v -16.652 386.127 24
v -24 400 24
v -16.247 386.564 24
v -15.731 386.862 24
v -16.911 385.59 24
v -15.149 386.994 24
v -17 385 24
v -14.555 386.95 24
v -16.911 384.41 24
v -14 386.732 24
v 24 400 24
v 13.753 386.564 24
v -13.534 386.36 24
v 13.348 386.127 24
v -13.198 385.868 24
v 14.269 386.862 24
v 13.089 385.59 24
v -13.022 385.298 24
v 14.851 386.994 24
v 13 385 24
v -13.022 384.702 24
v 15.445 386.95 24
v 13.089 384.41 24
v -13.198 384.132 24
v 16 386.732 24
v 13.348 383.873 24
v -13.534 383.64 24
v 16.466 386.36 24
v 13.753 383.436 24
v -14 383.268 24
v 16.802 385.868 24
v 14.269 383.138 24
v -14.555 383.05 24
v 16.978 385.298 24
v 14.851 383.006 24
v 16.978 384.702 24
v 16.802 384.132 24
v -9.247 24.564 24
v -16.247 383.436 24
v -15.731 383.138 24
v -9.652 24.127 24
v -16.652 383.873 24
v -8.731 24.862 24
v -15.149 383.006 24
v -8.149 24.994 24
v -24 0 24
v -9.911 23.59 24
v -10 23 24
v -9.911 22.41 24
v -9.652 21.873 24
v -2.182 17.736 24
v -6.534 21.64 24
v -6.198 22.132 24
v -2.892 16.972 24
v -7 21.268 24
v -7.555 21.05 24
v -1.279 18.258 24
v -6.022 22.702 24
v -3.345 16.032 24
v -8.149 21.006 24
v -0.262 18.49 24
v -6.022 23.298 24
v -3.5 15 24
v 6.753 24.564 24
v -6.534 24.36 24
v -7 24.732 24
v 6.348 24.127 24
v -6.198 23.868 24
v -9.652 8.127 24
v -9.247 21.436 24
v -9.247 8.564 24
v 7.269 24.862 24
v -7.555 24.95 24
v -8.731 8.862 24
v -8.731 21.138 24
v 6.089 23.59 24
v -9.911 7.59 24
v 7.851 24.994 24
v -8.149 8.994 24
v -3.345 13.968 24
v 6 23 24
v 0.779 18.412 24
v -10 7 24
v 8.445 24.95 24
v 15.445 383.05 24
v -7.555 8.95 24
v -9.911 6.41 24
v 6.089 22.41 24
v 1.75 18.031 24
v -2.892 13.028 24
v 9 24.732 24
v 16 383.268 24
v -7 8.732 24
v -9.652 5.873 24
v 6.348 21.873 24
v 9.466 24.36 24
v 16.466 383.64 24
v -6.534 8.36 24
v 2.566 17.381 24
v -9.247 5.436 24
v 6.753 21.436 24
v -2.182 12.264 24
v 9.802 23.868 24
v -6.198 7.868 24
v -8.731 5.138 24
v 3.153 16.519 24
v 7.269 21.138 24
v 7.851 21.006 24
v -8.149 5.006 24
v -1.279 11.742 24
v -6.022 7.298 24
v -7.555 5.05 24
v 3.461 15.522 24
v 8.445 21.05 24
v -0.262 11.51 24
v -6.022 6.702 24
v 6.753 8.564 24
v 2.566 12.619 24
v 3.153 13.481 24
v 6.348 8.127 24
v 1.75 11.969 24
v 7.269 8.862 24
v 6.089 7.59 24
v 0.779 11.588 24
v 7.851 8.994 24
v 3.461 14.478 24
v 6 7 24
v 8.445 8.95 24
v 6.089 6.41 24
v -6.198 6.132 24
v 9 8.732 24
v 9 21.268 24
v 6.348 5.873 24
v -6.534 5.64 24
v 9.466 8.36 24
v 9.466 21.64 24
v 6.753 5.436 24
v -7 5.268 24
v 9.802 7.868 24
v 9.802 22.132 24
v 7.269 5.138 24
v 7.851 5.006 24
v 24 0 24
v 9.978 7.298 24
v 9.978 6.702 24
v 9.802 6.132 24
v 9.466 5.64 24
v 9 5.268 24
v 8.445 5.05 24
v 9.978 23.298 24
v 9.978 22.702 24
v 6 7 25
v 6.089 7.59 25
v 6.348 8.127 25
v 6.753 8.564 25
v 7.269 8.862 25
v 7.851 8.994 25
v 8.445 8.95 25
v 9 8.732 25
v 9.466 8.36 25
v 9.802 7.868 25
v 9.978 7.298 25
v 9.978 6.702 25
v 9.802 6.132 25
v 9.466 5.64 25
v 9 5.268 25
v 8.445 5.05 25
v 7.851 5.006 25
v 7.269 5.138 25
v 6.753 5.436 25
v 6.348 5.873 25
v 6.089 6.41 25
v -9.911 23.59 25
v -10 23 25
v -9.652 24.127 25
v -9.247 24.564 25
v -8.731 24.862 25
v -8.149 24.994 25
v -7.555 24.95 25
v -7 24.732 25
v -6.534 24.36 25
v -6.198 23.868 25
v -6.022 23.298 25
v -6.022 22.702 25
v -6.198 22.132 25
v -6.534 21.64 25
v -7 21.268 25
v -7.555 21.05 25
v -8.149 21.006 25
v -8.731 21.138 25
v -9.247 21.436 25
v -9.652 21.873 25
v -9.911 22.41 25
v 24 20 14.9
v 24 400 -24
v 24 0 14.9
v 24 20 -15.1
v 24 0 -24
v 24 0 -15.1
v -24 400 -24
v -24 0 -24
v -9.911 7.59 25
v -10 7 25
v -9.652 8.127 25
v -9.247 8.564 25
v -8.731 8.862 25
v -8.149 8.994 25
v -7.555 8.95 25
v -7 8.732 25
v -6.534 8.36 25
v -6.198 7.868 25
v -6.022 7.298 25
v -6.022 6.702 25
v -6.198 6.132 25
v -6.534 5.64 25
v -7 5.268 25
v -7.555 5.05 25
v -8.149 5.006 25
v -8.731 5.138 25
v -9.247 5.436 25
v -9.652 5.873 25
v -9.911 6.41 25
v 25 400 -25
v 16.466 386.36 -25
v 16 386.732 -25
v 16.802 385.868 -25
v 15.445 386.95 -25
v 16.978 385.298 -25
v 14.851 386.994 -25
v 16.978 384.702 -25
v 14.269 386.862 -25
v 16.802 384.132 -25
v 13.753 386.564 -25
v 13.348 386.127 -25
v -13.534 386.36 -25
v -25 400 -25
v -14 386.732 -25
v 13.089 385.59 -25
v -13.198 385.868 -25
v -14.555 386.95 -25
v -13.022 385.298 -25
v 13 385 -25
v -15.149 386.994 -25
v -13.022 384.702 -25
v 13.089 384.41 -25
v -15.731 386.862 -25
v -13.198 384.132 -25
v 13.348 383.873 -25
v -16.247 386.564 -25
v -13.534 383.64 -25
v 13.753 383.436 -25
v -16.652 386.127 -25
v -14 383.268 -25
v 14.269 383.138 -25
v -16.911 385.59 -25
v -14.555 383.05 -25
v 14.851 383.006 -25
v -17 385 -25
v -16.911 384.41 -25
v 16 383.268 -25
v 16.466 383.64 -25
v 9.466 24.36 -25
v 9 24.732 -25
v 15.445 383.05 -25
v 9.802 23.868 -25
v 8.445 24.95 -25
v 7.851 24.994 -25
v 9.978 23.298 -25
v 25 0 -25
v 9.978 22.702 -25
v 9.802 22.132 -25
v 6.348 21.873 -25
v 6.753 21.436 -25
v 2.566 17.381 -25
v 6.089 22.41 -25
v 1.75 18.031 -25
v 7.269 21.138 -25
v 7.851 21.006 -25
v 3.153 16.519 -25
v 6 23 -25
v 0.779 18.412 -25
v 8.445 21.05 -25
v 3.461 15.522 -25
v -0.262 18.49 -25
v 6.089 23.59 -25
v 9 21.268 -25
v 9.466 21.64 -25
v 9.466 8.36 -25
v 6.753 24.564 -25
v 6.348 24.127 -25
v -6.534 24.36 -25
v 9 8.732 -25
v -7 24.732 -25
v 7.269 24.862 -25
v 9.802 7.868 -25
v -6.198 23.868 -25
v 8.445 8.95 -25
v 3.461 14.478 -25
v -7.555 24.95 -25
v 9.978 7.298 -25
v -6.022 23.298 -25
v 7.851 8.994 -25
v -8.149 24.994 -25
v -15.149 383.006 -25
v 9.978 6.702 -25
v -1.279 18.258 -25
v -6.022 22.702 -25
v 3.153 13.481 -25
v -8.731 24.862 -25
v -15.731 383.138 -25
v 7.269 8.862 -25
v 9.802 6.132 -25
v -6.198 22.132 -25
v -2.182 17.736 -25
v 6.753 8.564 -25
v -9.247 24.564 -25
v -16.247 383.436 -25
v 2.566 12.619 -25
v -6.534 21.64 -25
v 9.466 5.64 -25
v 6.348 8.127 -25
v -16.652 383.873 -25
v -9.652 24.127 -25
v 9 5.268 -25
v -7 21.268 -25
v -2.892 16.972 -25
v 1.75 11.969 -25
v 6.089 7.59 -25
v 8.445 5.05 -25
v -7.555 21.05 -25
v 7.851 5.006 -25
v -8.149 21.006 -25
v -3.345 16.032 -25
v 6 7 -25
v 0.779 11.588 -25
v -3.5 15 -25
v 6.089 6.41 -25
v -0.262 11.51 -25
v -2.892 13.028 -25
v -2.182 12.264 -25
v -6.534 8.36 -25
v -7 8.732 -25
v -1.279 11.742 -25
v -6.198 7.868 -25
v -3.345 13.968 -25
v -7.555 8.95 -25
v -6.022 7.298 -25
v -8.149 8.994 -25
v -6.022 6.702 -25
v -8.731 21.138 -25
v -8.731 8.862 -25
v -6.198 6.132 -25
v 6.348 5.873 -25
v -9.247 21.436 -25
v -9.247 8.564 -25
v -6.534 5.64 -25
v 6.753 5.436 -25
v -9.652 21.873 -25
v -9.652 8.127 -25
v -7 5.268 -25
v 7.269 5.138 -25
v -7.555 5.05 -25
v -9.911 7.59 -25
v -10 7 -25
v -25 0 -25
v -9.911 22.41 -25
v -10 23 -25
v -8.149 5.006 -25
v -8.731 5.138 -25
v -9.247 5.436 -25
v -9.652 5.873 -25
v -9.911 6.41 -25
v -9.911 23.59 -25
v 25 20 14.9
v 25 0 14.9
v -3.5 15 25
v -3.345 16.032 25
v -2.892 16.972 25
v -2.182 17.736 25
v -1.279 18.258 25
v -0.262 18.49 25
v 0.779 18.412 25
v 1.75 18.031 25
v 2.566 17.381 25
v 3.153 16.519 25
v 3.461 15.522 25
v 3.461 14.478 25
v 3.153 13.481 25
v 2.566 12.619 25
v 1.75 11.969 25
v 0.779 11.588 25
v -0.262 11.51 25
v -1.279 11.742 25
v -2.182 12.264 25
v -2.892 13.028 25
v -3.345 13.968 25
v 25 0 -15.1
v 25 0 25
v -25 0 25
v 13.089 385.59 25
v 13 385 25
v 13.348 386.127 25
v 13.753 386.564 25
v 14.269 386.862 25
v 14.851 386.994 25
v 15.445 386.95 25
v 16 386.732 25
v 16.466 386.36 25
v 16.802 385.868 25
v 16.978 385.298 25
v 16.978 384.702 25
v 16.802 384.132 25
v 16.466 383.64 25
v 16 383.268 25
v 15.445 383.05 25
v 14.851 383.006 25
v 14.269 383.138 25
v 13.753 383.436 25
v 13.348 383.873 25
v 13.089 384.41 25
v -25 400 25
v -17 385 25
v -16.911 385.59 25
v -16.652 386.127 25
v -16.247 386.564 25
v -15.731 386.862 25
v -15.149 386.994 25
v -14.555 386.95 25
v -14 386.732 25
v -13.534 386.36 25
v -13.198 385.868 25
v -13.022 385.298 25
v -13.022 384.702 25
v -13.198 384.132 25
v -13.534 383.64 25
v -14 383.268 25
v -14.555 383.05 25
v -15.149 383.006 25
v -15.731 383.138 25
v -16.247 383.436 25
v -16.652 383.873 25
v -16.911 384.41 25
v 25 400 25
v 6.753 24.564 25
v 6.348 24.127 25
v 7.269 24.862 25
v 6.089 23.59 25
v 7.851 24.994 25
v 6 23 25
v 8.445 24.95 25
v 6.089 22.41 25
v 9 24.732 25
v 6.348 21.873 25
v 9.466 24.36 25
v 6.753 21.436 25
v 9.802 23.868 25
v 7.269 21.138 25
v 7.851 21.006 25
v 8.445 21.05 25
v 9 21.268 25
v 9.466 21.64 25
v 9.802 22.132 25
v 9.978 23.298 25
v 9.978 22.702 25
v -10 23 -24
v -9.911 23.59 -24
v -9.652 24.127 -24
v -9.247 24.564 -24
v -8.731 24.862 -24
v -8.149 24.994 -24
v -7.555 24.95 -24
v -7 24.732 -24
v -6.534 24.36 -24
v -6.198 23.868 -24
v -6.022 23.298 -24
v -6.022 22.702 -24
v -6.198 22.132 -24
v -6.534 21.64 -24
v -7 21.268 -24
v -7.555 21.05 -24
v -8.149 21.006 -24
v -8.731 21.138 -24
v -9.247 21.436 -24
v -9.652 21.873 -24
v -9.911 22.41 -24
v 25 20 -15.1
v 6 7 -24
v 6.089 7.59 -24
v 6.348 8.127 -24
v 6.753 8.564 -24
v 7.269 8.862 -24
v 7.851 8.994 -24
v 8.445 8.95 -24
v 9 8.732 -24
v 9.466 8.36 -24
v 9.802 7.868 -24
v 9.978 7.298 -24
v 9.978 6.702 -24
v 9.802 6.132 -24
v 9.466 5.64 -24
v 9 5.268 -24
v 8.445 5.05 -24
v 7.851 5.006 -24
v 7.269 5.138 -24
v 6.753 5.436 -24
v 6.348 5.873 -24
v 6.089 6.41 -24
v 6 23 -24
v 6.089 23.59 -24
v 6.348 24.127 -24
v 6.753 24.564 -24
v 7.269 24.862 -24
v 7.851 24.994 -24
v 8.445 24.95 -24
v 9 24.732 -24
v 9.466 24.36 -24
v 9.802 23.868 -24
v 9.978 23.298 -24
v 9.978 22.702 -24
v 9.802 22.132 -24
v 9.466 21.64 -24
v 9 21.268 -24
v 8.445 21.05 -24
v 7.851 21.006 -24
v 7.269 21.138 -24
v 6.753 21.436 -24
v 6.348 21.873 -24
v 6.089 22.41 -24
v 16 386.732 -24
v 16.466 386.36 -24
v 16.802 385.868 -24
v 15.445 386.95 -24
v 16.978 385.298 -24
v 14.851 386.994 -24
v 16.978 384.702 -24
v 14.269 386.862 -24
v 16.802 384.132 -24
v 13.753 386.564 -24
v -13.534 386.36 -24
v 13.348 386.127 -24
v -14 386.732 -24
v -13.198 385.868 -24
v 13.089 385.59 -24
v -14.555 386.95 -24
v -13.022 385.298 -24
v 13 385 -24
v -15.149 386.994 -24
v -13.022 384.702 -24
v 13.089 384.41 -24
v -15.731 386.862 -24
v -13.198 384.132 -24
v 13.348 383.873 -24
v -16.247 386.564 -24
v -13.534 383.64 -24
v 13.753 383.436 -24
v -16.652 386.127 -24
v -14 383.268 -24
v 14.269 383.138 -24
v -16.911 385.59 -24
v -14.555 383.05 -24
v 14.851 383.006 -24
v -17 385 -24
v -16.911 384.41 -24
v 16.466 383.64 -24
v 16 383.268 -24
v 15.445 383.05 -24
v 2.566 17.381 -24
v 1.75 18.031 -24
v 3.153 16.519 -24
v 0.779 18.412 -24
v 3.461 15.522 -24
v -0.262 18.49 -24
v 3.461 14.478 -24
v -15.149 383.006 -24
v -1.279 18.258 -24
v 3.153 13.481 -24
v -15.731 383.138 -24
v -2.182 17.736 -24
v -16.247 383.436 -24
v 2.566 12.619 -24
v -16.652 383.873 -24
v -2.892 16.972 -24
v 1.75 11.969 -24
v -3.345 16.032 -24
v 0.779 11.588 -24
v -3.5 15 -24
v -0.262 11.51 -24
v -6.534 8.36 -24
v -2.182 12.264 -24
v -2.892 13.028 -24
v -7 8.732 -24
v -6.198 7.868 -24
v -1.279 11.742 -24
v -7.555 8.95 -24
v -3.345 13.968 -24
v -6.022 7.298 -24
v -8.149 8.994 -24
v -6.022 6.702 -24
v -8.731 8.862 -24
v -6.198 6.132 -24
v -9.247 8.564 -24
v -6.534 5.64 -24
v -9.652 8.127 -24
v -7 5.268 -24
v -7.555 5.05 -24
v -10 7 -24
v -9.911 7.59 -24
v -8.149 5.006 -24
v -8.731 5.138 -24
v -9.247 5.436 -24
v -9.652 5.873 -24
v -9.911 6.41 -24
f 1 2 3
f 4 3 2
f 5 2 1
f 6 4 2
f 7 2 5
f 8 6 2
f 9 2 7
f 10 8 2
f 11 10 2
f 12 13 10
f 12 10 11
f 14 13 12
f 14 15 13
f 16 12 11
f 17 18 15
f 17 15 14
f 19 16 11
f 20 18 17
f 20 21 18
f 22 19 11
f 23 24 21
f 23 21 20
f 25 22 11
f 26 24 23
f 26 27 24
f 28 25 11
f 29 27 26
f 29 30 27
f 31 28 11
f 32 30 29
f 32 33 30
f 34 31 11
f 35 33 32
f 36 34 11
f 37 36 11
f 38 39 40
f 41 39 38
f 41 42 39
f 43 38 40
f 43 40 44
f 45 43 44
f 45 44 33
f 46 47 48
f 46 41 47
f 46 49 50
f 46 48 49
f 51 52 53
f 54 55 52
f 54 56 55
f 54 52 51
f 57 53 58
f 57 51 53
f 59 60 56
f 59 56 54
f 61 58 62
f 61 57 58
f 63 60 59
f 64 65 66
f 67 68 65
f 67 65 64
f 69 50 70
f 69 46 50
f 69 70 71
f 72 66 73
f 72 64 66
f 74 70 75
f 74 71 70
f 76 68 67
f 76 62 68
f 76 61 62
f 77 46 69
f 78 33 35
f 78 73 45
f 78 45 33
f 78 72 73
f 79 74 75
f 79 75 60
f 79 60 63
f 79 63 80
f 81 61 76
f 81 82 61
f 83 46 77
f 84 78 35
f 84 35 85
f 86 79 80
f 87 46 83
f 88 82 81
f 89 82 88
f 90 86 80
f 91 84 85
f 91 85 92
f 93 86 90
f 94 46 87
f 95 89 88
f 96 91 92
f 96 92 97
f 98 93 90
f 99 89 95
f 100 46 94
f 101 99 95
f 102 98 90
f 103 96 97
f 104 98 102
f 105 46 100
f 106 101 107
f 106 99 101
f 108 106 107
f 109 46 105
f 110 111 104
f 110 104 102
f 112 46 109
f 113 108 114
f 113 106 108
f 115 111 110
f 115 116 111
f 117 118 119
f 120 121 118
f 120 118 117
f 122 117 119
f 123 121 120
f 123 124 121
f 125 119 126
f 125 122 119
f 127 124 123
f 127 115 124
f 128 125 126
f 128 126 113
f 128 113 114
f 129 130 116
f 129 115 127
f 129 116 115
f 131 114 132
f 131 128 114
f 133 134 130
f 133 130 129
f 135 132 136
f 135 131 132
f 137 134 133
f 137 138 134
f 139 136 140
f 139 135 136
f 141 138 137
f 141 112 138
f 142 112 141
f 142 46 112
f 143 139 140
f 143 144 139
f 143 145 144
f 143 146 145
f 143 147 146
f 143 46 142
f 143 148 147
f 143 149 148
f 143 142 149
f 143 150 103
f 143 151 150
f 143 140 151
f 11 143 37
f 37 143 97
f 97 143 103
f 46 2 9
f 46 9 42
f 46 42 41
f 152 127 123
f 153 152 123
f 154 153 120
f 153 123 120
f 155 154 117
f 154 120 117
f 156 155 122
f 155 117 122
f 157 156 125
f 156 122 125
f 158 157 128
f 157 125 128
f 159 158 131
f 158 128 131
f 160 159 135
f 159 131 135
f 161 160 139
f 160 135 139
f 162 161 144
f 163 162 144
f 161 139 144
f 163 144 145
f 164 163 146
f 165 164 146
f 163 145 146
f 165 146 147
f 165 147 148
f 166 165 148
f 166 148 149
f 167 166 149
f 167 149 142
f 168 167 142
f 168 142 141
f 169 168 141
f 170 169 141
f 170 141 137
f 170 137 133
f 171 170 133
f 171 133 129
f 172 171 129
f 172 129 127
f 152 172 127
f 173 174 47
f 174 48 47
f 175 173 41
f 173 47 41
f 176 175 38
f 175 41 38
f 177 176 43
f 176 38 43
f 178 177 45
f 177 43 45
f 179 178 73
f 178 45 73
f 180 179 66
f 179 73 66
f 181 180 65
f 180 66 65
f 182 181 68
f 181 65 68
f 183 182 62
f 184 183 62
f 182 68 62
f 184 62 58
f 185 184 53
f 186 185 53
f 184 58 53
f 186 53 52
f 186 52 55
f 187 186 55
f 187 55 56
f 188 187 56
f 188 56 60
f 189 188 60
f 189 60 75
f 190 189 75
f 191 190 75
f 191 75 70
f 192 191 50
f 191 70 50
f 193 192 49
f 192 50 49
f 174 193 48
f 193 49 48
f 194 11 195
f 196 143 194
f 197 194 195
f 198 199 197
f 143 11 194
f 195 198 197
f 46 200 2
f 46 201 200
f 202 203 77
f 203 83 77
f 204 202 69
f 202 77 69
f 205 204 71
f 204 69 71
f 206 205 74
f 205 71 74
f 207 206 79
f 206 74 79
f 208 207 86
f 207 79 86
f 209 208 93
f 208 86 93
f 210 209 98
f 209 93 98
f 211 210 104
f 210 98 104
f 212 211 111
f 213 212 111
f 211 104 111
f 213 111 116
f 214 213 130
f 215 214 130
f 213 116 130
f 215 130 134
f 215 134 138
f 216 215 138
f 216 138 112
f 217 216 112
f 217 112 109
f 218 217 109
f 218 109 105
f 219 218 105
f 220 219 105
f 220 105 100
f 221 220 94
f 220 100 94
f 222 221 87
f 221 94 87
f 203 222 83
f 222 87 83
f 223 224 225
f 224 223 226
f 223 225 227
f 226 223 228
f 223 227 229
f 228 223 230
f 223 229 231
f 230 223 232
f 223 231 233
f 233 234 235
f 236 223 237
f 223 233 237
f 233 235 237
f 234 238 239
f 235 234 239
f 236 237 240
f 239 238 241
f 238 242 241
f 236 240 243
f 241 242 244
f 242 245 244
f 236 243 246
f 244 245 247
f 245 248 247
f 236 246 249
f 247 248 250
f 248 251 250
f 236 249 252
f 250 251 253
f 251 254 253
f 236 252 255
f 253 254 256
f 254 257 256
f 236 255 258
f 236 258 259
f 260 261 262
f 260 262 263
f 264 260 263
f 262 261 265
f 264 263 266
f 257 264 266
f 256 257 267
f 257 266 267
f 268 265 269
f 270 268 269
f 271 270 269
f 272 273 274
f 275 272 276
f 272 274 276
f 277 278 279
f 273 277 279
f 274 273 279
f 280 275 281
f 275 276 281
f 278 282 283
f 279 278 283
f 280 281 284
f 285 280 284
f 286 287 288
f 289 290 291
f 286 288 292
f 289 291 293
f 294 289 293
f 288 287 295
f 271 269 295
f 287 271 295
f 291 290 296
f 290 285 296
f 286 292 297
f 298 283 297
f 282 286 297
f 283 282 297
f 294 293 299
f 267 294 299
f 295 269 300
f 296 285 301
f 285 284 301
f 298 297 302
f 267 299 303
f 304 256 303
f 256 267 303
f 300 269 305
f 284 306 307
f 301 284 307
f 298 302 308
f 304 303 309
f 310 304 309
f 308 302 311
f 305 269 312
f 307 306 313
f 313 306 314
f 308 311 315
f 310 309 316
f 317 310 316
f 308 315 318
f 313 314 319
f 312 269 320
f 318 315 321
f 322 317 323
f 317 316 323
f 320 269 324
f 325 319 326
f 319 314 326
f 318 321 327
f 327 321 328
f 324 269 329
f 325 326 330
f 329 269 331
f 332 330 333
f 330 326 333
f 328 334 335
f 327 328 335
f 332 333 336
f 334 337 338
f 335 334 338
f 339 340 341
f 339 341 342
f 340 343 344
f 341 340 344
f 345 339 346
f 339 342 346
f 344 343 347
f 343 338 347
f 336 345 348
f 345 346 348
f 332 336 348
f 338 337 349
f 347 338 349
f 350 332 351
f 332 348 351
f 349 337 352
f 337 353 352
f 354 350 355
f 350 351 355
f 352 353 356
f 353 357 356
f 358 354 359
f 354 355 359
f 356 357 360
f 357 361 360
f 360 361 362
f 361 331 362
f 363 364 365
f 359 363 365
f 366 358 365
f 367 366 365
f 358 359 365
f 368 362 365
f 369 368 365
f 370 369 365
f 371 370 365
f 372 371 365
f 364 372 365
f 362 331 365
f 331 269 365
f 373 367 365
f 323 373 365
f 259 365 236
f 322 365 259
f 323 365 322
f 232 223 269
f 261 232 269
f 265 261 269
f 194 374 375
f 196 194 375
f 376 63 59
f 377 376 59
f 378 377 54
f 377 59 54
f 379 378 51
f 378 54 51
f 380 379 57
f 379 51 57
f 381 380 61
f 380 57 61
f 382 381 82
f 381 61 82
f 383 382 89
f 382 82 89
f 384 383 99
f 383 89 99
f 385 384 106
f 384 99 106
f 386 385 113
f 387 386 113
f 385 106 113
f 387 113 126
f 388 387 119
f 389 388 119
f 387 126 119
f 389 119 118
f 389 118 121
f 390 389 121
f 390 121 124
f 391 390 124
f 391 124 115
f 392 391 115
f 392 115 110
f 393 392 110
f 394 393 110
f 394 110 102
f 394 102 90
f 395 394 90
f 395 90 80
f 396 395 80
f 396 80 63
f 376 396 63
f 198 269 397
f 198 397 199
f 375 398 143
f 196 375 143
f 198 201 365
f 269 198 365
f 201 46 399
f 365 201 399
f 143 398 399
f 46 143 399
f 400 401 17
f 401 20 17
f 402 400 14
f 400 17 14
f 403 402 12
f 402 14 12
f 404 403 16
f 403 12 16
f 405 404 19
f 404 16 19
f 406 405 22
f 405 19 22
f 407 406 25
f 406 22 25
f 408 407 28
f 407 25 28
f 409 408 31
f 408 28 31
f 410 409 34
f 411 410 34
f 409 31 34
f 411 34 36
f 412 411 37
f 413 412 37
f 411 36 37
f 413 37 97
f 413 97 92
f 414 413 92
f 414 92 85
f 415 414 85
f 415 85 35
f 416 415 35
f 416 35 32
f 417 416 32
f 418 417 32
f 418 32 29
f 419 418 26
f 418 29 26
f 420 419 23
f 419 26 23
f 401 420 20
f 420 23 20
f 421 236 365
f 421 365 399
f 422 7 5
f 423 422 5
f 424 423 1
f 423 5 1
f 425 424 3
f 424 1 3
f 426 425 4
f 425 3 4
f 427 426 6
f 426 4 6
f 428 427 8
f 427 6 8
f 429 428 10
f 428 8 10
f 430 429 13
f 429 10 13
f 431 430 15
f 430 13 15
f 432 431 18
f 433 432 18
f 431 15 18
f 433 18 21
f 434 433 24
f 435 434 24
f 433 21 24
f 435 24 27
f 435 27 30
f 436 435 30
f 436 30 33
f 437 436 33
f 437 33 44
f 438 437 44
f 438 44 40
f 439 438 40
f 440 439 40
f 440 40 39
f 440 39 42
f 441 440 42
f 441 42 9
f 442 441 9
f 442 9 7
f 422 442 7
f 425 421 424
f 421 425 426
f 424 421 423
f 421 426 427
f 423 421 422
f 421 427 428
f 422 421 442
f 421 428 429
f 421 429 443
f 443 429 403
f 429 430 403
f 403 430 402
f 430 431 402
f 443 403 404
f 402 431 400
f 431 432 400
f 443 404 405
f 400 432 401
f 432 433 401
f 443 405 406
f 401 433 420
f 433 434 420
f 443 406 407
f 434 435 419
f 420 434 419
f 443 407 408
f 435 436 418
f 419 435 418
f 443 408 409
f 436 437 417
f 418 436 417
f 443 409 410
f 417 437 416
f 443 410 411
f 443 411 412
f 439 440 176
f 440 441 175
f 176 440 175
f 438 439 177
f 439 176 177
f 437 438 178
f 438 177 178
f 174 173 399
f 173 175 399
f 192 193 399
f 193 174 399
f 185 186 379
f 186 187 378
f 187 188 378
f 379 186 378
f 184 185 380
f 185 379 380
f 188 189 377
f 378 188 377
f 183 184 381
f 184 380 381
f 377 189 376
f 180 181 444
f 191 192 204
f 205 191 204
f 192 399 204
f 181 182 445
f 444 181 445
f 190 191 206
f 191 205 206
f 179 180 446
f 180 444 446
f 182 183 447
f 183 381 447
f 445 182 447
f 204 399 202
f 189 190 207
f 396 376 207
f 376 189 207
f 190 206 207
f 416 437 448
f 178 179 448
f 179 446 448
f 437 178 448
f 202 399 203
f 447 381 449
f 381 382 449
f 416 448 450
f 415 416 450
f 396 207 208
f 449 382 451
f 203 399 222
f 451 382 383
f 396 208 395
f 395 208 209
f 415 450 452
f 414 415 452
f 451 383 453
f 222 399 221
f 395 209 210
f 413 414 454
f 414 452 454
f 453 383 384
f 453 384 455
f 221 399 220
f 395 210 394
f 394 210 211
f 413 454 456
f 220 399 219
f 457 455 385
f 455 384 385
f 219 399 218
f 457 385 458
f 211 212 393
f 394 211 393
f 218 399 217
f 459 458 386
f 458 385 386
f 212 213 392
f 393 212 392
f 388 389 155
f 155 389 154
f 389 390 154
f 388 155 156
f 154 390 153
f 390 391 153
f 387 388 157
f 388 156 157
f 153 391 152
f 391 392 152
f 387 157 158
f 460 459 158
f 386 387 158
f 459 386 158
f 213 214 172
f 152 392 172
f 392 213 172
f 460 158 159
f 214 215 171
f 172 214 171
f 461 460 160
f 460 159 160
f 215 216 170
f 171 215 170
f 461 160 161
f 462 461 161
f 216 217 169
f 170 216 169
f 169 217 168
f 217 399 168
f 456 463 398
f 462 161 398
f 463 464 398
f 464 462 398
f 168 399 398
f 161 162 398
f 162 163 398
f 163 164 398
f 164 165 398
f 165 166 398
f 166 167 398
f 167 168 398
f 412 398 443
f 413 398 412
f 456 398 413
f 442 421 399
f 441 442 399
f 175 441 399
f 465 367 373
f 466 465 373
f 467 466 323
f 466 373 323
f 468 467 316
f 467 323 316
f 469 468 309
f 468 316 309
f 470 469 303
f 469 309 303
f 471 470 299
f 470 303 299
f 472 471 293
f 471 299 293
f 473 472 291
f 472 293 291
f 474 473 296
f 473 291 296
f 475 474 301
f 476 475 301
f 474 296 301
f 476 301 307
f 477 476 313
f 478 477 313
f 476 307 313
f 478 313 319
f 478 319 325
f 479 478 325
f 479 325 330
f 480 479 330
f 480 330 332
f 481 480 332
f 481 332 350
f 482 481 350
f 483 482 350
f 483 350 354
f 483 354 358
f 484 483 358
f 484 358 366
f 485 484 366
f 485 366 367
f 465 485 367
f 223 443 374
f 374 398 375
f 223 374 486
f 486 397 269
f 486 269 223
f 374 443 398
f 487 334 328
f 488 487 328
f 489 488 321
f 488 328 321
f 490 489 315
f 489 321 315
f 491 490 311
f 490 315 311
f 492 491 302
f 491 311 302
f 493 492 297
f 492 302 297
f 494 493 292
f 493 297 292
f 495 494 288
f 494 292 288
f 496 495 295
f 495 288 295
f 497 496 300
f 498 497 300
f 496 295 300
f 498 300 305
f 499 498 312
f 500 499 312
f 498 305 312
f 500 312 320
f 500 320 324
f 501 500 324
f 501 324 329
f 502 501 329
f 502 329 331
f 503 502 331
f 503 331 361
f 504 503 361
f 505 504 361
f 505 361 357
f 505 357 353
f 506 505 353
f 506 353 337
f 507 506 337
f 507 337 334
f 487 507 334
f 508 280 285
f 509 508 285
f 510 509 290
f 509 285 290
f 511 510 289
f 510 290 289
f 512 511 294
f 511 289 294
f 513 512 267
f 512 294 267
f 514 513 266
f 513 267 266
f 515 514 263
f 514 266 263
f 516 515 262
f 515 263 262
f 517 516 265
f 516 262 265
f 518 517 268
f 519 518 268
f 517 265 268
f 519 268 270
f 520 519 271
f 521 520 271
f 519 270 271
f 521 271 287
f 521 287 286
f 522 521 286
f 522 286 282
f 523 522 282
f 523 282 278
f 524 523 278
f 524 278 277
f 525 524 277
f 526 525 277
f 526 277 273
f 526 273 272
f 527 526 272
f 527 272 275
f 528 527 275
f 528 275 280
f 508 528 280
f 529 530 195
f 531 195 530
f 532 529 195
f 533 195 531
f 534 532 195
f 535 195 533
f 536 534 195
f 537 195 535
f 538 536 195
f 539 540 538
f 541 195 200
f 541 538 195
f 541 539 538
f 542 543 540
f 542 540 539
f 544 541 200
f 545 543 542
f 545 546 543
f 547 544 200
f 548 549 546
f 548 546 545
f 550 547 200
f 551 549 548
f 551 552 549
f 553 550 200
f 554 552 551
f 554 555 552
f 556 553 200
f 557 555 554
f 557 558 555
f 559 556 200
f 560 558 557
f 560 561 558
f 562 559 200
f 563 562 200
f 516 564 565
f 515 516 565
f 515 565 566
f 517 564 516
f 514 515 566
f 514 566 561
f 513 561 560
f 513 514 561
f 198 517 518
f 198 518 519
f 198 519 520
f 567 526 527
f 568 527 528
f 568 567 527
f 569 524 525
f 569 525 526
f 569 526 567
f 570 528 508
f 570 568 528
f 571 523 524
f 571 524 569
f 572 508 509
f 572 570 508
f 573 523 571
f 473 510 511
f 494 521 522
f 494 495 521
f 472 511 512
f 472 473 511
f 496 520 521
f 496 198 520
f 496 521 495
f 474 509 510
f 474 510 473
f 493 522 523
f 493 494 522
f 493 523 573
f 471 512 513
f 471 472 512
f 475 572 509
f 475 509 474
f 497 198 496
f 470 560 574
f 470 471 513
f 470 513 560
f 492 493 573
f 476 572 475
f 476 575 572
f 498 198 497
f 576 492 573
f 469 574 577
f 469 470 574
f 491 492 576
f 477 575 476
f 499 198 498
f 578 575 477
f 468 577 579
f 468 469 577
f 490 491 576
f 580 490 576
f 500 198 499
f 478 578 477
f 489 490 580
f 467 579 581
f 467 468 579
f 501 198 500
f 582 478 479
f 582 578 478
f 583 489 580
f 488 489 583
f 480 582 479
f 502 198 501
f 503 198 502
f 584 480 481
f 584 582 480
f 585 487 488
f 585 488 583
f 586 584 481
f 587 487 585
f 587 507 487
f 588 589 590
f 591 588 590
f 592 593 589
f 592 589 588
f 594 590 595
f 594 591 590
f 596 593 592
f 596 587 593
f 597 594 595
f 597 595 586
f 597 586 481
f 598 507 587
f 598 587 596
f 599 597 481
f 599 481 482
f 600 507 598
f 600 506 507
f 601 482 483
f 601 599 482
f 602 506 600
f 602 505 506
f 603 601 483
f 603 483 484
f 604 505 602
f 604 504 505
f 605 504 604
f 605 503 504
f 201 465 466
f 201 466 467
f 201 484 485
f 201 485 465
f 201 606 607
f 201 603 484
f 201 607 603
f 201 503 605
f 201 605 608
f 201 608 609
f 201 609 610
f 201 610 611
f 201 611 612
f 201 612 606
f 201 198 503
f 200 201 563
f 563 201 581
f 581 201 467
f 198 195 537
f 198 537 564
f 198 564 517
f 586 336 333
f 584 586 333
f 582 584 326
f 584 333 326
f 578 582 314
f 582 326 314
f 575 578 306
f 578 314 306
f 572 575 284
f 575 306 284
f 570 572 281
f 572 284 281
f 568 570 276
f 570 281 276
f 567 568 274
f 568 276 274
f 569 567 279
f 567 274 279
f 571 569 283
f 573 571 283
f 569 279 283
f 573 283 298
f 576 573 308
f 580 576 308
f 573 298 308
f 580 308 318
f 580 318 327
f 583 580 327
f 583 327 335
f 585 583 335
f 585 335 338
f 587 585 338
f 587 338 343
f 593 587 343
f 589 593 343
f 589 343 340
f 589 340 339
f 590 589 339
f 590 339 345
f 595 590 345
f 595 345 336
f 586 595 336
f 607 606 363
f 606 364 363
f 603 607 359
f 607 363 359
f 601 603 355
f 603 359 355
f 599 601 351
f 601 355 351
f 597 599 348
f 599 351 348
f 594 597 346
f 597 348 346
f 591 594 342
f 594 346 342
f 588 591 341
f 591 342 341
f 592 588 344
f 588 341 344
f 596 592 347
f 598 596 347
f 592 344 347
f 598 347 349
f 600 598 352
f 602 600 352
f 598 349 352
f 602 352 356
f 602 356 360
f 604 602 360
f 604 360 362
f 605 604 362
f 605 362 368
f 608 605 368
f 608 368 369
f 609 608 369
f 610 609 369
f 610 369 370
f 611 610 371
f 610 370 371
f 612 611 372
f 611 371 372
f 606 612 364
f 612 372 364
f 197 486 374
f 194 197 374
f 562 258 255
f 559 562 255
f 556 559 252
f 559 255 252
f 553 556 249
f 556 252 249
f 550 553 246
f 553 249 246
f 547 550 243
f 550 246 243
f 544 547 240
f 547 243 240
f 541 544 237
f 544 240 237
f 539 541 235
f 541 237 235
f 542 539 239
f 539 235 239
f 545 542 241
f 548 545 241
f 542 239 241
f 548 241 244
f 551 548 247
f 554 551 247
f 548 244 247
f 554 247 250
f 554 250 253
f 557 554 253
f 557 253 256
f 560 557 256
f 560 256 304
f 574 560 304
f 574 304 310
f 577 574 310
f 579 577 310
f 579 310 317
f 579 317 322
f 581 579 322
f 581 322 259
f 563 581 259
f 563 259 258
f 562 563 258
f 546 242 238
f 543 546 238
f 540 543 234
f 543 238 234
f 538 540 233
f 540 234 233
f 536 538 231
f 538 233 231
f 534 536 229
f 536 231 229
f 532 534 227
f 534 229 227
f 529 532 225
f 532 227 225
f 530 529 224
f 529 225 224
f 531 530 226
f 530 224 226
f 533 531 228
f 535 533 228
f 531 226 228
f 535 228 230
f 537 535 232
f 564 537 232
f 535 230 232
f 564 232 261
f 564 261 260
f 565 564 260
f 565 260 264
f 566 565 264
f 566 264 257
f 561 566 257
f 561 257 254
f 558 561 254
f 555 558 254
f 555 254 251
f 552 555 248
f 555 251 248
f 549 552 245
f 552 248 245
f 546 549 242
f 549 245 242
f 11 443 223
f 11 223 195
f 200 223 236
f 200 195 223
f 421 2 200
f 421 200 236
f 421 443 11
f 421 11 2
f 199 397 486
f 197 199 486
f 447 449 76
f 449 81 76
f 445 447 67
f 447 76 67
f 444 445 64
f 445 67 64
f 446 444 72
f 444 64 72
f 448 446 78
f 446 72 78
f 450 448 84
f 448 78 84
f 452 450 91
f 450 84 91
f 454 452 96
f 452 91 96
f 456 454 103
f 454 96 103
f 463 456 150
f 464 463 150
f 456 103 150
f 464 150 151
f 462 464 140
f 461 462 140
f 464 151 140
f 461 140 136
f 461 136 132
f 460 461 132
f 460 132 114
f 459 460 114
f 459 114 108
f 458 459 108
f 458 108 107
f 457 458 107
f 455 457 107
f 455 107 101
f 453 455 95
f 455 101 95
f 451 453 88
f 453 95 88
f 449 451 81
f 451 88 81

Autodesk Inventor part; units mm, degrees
ref_plane "YZ Plane" through (0, 0, 0) normal (1, 0, 0) x (0, 1, 0)
ref_plane "XZ Plane" through (0, 0, 0) normal (0, 1, 0) x (-1, 0, 0)
ref_plane "XY Plane" through (0, 0, 0) normal (0, 0, 1) x (1, 0, 0)
sketch "Sketch1" plane through (0, 0, 0) normal (0, 1, 0) x (-1, 0, 0)
  line L0 (25, 25) -> (-25, 25)
  line L1 (-25, 25) -> (-25, -25)
  line L2 (-25, -25) -> (25, -25)
  line L3 (25, -25) -> (25, 25)
  line L4 (25, 25) -> (-25, -25) construction
  line L5 (-25, 25) -> (25, -25) construction
  line L6 (24, 24) -> (-24, 24)
  line L7 (-24, 24) -> (-24, -24)
  line L8 (-24, -24) -> (24, -24)
  line L9 (24, -24) -> (24, 24)
  line L10 (24, 24) -> (-24, -24) construction
  line L11 (-24, 24) -> (24, -24) construction
  point P0 (0, 0)
  dimension "d0" = 50
  dimension "d2" = 48
extrude "Extrusion1" add sketch "Sketch1" along normal blind 400
sketch "Sketch3" plane through (25, 0, -25) normal (0, 0, -1) x (-1, 0, 0)
  line L0 (50, 0) -> (50, 400) projected
  line L1 (0, 0) -> (50, 0)
  line L2 (50, 0) -> (50, 30)
  line L3 (50, 30) -> (0, 30)
  line L4 (0, 30) -> (0, 0)
  line L5 (50, 30) -> (0, 0) construction
  line L6 (0, 0) -> (0, 400) projected
  line L7 (50, 0) -> (50, 400) projected
  line L8 (0, 400) -> (50, 400)
  line L9 (50, 400) -> (50, 370)
  line L10 (50, 370) -> (0, 370)
  line L11 (0, 370) -> (0, 400)
  line L12 (0, 400) -> (50, 370) construction
  circle A0 centre (40, 385) radius 2
  line L13 (25, 385) -> (40, 385) construction
  line L14 (25, 385) -> (10, 385) construction
  circle A1 centre (10, 385) radius 2
  circle A2 centre (25, 15) radius 3.5
  line L15 (17, 23) -> (33, 23) construction
  line L16 (33, 23) -> (33, 7) construction
  line L17 (33, 7) -> (17, 7) construction
  line L18 (17, 7) -> (17, 23) construction
  line L19 (17, 23) -> (33, 7) construction
  line L20 (33, 23) -> (17, 7) construction
  circle A3 centre (17, 23) radius 2
  circle A4 centre (33, 23) radius 2
  circle A5 centre (33, 7) radius 2
  circle A6 centre (17, 7) radius 2
  line L21 (25, 15) -> (29.6644, 19.6644) construction
  point P0 (25, 0)
  dimension "d19" = 30
  dimension "d28" = 30
  dimension "d29" = 4
  dimension "d30" = 15
  dimension "d31" = 15
  dimension "d32" = 4
  dimension "d33" = 7
  dimension "d34" = 16
  dimension "d35" = 4
extrude "Extrusion3" cut sketch "Sketch3" against normal blind 50 contours A0 | A1 | A2 | A3 | A4 | A5 | A6
sketch "Sketch4" plane through (25, 0, 25) normal (1, 0, 0) x (0, 0, -1)
  line L0 (50, 0) -> (0, 0) construction
  line L1 (0, 0) -> (10.1, 0) construction
  line L2 (10.1, 0) -> (40.1, 0)
  line L3 (40.1, 0) -> (40.1, 20)
  line L4 (40.1, 20) -> (10.1, 20)
  line L5 (10.1, 20) -> (10.1, 0)
  point P0 (25, 0)
  dimension "d23" = 10.1
  dimension "d24" = 30
  dimension "d25" = 20
extrude "Extrusion4" cut sketch "Sketch4" against normal blind 10
properties part number "End-Link" material "Aluminum 6061"
